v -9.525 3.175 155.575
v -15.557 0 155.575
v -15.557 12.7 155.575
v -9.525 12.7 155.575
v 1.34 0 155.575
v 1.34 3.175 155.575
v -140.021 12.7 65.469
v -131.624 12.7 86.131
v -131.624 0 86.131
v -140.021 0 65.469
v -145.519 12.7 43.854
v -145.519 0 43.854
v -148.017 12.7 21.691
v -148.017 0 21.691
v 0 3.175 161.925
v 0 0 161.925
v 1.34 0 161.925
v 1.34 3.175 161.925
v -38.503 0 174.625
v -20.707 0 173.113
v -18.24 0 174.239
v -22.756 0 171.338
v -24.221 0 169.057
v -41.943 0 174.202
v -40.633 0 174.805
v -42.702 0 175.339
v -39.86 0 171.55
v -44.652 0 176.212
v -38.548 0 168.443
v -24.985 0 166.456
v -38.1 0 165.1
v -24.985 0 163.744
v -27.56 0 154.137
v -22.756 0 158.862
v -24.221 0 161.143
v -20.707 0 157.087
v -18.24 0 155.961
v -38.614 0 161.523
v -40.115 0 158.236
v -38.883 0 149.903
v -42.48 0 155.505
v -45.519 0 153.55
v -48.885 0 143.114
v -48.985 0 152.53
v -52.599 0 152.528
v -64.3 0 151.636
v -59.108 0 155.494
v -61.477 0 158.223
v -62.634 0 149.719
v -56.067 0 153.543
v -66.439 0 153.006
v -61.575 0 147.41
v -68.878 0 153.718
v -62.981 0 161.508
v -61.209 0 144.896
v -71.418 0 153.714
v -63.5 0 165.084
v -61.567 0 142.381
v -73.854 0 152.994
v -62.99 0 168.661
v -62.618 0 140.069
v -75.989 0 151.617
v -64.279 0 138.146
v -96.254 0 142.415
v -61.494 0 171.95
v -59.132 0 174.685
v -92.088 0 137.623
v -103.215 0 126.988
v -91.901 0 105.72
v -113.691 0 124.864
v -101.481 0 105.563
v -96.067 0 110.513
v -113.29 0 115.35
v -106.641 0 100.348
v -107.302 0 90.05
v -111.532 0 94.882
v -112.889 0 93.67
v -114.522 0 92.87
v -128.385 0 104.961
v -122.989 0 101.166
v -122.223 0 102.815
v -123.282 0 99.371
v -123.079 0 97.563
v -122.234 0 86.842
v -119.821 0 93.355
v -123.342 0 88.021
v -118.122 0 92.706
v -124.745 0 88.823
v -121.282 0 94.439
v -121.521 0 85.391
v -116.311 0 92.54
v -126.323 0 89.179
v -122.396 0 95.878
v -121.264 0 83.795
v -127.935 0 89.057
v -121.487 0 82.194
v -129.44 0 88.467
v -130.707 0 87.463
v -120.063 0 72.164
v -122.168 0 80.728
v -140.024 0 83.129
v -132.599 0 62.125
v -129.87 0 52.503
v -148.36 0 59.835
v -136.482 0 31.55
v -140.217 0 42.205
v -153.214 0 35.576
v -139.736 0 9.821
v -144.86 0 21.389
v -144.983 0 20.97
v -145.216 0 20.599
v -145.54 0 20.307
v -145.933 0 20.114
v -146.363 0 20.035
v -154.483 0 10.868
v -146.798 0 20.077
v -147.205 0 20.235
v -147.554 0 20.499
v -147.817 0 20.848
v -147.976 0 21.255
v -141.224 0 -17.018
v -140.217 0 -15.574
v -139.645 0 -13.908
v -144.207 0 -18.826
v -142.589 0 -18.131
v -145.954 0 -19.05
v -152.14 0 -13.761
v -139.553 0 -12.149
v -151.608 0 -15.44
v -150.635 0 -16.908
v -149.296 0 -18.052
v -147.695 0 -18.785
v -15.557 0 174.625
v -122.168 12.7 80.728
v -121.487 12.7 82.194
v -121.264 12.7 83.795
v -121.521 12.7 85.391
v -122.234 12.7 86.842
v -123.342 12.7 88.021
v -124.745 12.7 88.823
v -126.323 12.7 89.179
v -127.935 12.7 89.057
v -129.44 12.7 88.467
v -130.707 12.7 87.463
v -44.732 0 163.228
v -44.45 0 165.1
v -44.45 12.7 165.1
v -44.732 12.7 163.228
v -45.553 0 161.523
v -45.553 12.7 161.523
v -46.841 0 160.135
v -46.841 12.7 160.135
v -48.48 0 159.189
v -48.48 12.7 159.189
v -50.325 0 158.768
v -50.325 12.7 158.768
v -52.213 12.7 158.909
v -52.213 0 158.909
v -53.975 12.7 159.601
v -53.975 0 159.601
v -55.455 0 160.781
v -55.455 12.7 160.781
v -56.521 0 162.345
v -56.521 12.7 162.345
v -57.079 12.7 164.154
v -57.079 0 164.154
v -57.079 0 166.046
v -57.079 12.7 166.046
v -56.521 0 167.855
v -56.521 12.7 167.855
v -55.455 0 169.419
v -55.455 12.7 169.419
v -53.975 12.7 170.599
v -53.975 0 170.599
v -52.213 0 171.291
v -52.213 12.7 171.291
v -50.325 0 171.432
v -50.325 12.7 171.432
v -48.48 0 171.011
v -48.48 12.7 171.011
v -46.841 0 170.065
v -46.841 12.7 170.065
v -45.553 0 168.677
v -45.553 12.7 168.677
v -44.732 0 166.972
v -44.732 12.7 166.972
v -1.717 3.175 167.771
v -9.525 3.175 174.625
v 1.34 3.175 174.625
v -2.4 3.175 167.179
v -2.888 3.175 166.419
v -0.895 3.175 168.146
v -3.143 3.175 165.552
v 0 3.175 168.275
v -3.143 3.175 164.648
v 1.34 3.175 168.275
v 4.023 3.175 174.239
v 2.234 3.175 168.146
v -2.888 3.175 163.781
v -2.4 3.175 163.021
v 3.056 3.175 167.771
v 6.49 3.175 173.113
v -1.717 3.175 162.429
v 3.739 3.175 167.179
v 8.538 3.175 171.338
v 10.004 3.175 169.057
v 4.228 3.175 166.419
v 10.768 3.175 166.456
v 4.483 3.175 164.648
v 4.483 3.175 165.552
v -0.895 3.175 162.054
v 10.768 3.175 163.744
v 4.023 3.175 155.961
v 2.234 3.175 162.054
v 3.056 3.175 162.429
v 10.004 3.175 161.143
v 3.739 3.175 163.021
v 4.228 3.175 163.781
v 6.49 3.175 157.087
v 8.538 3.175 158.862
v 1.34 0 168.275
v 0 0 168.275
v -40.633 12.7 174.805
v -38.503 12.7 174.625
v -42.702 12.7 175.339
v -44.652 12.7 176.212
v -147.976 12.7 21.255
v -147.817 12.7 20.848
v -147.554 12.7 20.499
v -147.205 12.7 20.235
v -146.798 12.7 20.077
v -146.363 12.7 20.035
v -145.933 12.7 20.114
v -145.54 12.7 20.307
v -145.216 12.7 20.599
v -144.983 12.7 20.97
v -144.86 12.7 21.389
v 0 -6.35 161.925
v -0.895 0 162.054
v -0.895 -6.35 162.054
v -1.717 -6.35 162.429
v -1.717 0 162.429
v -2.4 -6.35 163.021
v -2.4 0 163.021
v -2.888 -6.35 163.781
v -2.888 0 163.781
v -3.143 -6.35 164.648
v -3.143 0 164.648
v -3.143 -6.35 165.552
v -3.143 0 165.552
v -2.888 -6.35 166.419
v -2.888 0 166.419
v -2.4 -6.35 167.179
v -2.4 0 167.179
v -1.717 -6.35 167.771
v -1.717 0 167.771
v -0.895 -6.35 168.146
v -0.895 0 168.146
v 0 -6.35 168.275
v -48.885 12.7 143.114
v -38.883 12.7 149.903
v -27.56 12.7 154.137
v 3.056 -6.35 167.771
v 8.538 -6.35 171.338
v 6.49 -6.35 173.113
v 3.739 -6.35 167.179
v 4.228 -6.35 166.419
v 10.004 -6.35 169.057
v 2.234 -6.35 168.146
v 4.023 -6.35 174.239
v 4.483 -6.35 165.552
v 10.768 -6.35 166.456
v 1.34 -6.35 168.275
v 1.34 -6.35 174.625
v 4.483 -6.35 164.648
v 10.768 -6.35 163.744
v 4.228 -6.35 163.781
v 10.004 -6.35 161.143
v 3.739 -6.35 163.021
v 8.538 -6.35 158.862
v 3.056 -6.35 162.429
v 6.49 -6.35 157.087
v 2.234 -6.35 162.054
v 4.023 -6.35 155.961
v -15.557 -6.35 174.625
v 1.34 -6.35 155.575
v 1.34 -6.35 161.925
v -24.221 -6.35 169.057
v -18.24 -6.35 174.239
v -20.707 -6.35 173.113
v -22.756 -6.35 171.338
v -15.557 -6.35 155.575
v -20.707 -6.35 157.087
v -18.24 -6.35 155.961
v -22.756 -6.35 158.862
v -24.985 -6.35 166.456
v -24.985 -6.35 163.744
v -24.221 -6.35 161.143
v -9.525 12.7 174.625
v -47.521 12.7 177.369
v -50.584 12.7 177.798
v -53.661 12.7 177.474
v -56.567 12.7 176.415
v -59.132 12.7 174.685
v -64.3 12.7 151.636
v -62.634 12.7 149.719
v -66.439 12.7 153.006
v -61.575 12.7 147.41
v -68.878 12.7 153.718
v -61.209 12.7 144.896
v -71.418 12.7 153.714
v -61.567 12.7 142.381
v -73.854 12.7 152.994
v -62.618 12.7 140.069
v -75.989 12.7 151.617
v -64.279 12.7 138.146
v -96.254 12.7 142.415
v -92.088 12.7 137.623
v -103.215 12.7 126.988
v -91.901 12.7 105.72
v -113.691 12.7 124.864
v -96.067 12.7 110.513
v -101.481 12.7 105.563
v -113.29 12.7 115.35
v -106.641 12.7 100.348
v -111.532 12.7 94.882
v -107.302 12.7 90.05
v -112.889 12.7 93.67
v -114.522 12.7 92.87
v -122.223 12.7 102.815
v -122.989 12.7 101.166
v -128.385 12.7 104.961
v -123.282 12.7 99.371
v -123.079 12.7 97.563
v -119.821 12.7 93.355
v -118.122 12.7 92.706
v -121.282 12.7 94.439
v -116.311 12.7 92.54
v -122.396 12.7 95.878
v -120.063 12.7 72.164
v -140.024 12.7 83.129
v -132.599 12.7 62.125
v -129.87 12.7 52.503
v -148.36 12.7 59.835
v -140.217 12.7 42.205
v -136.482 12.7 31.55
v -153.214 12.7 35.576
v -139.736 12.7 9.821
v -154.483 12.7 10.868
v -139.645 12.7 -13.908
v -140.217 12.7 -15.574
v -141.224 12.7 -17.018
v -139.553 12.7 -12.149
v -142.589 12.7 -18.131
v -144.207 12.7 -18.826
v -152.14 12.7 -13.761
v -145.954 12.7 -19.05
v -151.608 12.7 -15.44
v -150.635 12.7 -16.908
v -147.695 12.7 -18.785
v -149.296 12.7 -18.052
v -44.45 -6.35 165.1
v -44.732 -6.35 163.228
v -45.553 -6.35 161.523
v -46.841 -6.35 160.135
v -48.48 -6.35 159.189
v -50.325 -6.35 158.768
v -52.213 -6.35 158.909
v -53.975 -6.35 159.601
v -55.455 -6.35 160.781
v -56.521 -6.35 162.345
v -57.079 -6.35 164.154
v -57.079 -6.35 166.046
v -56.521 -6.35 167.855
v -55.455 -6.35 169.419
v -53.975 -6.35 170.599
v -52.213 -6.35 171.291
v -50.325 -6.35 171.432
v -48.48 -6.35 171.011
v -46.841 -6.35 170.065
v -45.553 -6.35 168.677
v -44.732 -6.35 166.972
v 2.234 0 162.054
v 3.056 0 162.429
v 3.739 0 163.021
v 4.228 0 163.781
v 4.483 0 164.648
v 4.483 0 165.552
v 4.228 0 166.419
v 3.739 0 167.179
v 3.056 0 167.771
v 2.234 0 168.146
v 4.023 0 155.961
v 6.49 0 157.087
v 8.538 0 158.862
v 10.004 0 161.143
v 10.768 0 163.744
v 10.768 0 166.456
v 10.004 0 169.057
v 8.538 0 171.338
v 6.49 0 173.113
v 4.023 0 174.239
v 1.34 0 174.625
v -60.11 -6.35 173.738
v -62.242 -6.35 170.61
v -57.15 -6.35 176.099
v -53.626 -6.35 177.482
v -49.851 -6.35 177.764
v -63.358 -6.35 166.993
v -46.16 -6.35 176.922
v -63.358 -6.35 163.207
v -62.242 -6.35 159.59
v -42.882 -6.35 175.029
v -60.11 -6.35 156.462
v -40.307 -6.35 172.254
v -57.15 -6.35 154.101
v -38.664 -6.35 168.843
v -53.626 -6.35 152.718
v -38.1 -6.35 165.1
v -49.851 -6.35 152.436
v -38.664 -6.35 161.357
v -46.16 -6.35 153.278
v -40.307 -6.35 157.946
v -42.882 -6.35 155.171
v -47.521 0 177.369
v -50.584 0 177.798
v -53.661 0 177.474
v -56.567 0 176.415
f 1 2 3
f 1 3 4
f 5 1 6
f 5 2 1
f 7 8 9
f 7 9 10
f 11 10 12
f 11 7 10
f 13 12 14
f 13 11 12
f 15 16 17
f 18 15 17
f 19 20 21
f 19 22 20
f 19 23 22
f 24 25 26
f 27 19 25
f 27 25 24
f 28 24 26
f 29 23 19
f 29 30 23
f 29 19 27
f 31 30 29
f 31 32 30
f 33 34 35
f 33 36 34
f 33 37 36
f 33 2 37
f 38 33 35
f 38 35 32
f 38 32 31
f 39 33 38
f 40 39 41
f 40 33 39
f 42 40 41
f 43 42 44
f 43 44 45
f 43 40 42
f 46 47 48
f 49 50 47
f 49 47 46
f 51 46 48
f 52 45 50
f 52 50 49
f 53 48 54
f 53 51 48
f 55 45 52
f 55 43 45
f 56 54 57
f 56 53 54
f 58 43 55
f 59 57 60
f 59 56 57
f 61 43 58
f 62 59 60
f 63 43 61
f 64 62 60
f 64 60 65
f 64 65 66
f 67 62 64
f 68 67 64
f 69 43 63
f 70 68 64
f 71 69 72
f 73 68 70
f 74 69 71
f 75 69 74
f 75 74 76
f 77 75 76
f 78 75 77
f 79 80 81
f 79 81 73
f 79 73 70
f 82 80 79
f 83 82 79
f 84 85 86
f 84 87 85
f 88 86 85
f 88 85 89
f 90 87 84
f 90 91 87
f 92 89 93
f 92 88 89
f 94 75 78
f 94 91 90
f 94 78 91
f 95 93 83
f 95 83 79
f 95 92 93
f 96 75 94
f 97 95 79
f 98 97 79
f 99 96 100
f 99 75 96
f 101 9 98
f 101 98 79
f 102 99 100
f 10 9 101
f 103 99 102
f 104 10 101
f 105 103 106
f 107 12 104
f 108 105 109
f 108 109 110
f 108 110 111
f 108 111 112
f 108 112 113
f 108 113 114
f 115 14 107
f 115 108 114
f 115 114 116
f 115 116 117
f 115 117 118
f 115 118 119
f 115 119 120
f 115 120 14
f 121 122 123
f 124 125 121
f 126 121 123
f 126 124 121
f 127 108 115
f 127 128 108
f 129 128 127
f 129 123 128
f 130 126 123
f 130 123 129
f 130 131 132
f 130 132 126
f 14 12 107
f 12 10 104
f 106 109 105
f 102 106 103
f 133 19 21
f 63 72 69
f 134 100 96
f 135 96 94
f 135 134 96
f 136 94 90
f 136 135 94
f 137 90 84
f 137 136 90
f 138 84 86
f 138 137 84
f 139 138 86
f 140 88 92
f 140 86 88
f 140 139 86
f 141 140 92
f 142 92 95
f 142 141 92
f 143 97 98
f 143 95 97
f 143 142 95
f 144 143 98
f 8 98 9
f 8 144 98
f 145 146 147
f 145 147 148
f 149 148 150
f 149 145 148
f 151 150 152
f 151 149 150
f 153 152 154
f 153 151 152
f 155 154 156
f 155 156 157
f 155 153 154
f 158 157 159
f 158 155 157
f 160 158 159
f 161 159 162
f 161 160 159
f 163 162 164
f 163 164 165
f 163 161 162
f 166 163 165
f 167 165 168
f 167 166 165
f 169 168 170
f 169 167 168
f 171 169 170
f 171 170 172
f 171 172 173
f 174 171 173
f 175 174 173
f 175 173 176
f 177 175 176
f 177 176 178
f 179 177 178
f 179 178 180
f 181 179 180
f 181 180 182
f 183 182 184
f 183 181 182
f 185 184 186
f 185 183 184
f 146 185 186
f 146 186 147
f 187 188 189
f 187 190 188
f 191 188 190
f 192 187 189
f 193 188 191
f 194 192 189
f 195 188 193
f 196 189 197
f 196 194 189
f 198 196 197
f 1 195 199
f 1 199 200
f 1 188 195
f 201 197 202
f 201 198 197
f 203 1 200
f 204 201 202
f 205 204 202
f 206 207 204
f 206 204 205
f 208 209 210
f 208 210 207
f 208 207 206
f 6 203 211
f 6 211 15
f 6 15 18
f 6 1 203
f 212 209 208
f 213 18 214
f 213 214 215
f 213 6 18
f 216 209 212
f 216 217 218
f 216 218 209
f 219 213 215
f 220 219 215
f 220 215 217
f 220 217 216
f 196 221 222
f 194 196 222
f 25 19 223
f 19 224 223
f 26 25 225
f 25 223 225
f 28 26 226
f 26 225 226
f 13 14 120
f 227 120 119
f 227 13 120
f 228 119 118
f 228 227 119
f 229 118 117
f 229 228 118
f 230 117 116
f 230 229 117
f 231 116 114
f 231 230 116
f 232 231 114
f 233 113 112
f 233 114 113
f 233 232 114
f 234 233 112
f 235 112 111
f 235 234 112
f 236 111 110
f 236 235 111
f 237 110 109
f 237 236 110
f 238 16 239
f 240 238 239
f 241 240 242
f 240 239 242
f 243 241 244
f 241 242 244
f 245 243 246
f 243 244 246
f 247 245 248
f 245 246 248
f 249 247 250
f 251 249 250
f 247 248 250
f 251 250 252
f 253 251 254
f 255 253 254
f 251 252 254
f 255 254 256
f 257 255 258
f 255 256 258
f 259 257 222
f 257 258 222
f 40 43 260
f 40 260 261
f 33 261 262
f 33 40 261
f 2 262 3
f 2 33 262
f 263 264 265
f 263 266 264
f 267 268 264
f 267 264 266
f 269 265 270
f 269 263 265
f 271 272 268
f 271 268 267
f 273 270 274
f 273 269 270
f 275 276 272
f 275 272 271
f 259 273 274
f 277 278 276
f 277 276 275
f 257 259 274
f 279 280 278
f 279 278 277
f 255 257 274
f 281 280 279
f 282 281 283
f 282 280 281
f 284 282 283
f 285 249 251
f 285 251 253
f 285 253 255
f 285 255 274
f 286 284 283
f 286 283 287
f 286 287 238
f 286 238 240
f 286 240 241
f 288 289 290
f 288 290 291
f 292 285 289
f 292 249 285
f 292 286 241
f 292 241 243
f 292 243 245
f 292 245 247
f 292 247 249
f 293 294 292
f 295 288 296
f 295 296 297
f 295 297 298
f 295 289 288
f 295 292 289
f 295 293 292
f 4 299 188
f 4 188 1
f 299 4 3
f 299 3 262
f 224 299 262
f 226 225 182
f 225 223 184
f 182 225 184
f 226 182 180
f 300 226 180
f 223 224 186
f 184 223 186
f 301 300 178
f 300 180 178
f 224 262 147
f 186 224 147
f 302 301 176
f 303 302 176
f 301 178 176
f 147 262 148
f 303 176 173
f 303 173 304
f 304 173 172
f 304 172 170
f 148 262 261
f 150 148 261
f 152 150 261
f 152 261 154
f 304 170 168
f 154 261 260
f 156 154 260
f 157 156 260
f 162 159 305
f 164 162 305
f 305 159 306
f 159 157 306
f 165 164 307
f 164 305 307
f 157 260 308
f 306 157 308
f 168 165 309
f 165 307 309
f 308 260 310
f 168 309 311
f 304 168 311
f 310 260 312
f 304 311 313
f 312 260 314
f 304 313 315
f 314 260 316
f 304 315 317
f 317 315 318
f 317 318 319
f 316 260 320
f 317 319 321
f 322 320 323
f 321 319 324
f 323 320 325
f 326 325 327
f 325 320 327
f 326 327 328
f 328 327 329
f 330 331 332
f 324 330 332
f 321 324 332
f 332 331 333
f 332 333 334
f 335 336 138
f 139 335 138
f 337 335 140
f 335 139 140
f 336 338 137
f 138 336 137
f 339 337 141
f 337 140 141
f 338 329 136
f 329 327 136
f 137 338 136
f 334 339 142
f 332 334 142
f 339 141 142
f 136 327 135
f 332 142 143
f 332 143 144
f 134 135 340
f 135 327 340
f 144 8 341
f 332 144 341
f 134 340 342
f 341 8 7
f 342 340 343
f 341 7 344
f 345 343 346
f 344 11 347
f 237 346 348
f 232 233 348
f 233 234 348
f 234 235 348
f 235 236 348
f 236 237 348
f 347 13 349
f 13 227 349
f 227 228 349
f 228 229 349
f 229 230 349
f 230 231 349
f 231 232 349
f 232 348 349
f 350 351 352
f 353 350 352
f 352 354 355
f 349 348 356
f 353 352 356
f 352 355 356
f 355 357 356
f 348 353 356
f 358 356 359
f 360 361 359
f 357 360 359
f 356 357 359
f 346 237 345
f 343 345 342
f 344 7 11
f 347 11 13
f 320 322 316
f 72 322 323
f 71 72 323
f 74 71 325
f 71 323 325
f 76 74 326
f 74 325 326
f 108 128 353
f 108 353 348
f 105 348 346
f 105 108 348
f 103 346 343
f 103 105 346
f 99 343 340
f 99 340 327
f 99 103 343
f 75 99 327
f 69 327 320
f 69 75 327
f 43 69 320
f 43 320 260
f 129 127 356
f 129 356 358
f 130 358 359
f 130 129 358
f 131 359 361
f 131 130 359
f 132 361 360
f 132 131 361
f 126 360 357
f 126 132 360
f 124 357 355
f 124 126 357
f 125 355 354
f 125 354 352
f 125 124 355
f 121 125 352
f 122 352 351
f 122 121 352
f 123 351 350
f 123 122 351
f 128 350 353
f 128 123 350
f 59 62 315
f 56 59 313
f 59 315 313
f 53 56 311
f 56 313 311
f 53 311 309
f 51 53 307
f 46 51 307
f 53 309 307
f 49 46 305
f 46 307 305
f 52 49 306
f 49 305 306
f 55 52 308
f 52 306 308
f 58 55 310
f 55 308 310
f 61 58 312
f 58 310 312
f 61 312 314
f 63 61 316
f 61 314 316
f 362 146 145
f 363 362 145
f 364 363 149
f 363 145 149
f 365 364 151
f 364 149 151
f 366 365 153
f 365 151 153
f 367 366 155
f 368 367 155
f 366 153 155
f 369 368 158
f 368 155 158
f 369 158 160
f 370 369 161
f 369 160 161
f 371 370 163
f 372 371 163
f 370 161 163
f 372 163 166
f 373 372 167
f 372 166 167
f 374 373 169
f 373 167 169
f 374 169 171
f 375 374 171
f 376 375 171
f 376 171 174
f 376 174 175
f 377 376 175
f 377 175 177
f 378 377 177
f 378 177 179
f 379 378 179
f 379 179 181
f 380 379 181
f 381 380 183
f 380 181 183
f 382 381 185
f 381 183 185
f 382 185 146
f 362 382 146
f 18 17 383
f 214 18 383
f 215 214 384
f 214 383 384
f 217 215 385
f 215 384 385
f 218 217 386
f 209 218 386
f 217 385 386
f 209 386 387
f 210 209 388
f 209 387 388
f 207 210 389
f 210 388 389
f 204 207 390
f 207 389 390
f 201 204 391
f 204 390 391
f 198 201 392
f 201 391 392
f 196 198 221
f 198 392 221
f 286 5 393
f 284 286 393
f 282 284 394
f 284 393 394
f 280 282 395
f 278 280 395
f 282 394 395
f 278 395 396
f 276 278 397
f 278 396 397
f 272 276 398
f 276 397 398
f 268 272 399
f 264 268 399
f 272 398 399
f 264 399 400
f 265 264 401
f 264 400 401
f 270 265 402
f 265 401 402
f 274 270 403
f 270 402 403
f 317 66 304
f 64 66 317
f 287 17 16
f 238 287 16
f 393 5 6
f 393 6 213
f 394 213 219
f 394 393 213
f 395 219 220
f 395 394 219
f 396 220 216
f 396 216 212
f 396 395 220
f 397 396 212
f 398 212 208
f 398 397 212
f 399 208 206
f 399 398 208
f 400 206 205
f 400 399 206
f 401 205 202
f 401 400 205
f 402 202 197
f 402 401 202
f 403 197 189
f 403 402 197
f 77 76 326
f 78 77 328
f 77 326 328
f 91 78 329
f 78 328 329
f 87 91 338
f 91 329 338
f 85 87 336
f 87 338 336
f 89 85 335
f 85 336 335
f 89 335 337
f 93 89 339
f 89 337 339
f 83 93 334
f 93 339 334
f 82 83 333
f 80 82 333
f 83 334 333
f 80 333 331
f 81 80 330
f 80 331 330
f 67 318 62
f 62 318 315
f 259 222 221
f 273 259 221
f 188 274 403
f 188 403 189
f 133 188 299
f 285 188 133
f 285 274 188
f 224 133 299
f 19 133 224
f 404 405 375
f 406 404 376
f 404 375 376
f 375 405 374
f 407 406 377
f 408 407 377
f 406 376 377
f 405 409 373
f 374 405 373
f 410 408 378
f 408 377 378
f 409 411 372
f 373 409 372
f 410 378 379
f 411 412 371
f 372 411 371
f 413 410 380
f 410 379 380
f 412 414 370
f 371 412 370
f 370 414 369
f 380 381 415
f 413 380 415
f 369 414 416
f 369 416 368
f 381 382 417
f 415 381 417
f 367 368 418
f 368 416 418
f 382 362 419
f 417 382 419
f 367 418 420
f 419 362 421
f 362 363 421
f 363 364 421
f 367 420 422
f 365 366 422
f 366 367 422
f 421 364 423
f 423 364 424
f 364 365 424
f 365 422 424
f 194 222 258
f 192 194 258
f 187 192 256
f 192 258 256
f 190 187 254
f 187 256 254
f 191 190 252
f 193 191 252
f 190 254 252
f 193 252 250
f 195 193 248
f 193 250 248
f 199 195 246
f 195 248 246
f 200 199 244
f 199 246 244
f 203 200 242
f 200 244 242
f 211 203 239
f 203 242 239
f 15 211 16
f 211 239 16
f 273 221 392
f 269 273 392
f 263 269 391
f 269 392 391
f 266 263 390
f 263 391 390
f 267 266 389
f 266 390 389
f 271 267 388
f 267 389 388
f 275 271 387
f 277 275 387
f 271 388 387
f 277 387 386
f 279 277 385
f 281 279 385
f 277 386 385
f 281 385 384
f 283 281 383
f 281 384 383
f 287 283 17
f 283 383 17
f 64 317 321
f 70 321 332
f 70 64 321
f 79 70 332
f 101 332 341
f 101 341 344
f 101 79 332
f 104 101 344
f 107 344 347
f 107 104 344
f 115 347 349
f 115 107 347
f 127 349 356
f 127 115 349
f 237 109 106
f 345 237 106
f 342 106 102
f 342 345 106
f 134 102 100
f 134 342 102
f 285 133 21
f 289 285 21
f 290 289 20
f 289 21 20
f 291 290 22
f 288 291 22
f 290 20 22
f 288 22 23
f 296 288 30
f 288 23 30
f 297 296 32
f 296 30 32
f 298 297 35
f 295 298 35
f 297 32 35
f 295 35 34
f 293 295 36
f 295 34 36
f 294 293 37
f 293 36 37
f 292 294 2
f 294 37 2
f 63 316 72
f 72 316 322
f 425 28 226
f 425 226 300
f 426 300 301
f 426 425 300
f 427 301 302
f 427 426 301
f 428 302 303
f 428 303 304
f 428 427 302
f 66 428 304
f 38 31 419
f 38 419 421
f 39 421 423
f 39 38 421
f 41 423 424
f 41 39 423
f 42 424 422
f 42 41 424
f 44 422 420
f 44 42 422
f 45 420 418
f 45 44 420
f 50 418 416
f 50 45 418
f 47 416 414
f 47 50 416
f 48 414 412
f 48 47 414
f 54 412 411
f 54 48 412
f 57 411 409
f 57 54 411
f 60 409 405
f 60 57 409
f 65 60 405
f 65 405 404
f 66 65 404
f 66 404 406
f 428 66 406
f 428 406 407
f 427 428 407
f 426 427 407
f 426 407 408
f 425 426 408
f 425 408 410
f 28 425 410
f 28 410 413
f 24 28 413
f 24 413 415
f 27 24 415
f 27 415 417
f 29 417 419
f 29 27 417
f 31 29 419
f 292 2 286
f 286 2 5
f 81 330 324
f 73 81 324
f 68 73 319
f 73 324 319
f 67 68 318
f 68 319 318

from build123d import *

# Parameters (mm, degrees)
SKETCH1_R           = 6.35
BOSS_EXTRUDE1_DEPTH = 12.7
CUT_EXTRUDE2_DEPTH  = 13.7
FILLET1_R           = 12.7
SKETCH4_R           = 12.7
SKETCH4_R_2         = 6.35
BOSS_EXTRUDE2_DEPTH = 6.35
SKETCH2_W           = 27.073872012
SKETCH2_H           = 29.596885175
CUT_EXTRUDE1_DEPTH  = 9.525


with BuildPart() as part:
    # Sketch1 → Boss-Extrude1 (new body)
    with BuildSketch(Plane(origin=(0, 0, 0), x_dir=(1, 0, 0), z_dir=(0, 1, 0))):
        with BuildLine():
            Line((1.339902706, -174.625), (-42.399739587, -174.625))
            ThreePointArc((-42.399739587, -174.625), (-50.754602331, -177.79991886), (-59.131949668, -174.684811669))
            Line((-59.131949668, -174.684811669), (-96.253765638, -142.415309363))
            ThreePointArc((-96.253765638, -142.415309363), (-144.617963608, -71.634466036), (-152.13989844, 13.761341376))
            ThreePointArc((-152.13989844, 13.761341376), (-145.072520944, 18.99854995), (-139.553151074, 12.149262793))
            ThreePointArc((-139.553151074, 12.149262793), (-129.869632709, -52.503000495), (-91.90140484, -105.720472707))
            Line((-91.90140484, -105.720472707), (-48.88478864, -143.114246675))
            ThreePointArc((-48.88478864, -143.114246675), (-33.347524936, -152.357947214), (-15.556989968, -155.575))
            Line((-15.556989968, -155.575), (1.339902706, -155.575))
            ThreePointArc((1.339902706, -155.575), (10.864902706, -165.1), (1.339902706, -174.625))
        make_face()
        with Locations((-50.8, -165.1)):
            Circle(SKETCH1_R, mode=Mode.SUBTRACT)
        with BuildLine():
            Line((0, -161.925), (1.339902706, -161.925))
            ThreePointArc((1.339902706, -161.925), (4.514902706, -165.1), (1.339902706, -168.275))
            Line((1.339902706, -168.275), (0, -168.275))
            ThreePointArc((0, -168.275), (-3.175, -165.1), (0, -161.925))
        make_face(mode=Mode.SUBTRACT)
    extrude(amount=BOSS_EXTRUDE1_DEPTH)

    # Sketch3 → Cut-Extrude2 (cut, through all)
    with BuildSketch(Plane(origin=(0, 12.7, 0), x_dir=(1, 0, 0), z_dir=(0, 1, 0))):
        with BuildLine():
            Line((-64.278893585, -138.146187914), (-96.067379674, -110.512878542))
            ThreePointArc((-96.067379674, -110.512878542), (-104.093661598, -102.988093371), (-111.532318829, -94.88192461))
            ThreePointArc((-111.532318829, -94.88192461), (-120.588765116, -93.847414192), (-122.222718656, -102.815113283))
            ThreePointArc((-122.222718656, -102.815113283), (-108.389889378, -121.287896312), (-92.087790804, -137.622903528))
            Line((-92.087790804, -137.622903528), (-75.989121055, -151.617263638))
            ThreePointArc((-75.989121055, -151.617263638), (-63.398469458, -150.736839511), (-64.278893585, -138.146187914))
        make_face()
        with BuildLine():
            ThreePointArc((-122.168303836, -80.727586976), (-124.013598755, -88.474110491), (-131.62448434, -86.131428157))
            ThreePointArc((-131.62448434, -86.131428157), (-143.140144863, -54.755391727), (-148.016867664, -21.690551276))
            ThreePointArc((-148.016867664, -21.690551276), (-146.581764091, -20.040770563), (-144.860415421, -21.389198324))
            ThreePointArc((-144.860415421, -21.389198324), (-136.771142128, -52.303847297), (-122.168303836, -80.727586976))
        make_face()
    extrude(amount=-CUT_EXTRUDE2_DEPTH, mode=Mode.SUBTRACT)

    # Fillet1
    fillet1_edges = [part.edges().sort_by_distance(p)[0] for p in [
        (-42.399739587, 6.35, 174.625),
    ]]
    fillet(fillet1_edges, radius=FILLET1_R)

    # Sketch4 → Boss-Extrude2 (add)
    with BuildSketch(Plane(origin=(0, 0, 0), x_dir=(1, 0, 0), z_dir=(0, 1, 0))):
        with Locations((-50.8, -165.1)):
            Circle(SKETCH4_R)
        with Locations((-50.8, -165.1)):
            Circle(SKETCH4_R_2, mode=Mode.SUBTRACT)
        with BuildLine():
            Line((1.339902706, -174.625), (-15.556989968, -174.625))
            ThreePointArc((-15.556989968, -174.625), (-25.081989968, -165.1), (-15.556989968, -155.575))
            Line((-15.556989968, -155.575), (1.339902706, -155.575))
            ThreePointArc((1.339902706, -155.575), (10.864902706, -165.1), (1.339902706, -174.625))
        make_face()
        with BuildLine():
            Line((1.339902706, -161.925), (0, -161.925))
            ThreePointArc((0, -161.925), (-3.175, -165.1), (0, -168.275))
            Line((0, -168.275), (1.339902706, -168.275))
            ThreePointArc((1.339902706, -168.275), (4.514902706, -165.1), (1.339902706, -161.925))
        make_face(mode=Mode.SUBTRACT)
    extrude(amount=-BOSS_EXTRUDE2_DEPTH)

    # Sketch2 → Cut-Extrude1 (cut)
    with BuildSketch(Plane(origin=(0, 12.7, 0), x_dir=(1, 0, 0), z_dir=(0, 1, 0))):
        with Locations((4.011936006, -165.256904056)):
            Rectangle(SKETCH2_W, SKETCH2_H)
    extrude(amount=-CUT_EXTRUDE1_DEPTH, mode=Mode.SUBTRACT)


solid = part.part
